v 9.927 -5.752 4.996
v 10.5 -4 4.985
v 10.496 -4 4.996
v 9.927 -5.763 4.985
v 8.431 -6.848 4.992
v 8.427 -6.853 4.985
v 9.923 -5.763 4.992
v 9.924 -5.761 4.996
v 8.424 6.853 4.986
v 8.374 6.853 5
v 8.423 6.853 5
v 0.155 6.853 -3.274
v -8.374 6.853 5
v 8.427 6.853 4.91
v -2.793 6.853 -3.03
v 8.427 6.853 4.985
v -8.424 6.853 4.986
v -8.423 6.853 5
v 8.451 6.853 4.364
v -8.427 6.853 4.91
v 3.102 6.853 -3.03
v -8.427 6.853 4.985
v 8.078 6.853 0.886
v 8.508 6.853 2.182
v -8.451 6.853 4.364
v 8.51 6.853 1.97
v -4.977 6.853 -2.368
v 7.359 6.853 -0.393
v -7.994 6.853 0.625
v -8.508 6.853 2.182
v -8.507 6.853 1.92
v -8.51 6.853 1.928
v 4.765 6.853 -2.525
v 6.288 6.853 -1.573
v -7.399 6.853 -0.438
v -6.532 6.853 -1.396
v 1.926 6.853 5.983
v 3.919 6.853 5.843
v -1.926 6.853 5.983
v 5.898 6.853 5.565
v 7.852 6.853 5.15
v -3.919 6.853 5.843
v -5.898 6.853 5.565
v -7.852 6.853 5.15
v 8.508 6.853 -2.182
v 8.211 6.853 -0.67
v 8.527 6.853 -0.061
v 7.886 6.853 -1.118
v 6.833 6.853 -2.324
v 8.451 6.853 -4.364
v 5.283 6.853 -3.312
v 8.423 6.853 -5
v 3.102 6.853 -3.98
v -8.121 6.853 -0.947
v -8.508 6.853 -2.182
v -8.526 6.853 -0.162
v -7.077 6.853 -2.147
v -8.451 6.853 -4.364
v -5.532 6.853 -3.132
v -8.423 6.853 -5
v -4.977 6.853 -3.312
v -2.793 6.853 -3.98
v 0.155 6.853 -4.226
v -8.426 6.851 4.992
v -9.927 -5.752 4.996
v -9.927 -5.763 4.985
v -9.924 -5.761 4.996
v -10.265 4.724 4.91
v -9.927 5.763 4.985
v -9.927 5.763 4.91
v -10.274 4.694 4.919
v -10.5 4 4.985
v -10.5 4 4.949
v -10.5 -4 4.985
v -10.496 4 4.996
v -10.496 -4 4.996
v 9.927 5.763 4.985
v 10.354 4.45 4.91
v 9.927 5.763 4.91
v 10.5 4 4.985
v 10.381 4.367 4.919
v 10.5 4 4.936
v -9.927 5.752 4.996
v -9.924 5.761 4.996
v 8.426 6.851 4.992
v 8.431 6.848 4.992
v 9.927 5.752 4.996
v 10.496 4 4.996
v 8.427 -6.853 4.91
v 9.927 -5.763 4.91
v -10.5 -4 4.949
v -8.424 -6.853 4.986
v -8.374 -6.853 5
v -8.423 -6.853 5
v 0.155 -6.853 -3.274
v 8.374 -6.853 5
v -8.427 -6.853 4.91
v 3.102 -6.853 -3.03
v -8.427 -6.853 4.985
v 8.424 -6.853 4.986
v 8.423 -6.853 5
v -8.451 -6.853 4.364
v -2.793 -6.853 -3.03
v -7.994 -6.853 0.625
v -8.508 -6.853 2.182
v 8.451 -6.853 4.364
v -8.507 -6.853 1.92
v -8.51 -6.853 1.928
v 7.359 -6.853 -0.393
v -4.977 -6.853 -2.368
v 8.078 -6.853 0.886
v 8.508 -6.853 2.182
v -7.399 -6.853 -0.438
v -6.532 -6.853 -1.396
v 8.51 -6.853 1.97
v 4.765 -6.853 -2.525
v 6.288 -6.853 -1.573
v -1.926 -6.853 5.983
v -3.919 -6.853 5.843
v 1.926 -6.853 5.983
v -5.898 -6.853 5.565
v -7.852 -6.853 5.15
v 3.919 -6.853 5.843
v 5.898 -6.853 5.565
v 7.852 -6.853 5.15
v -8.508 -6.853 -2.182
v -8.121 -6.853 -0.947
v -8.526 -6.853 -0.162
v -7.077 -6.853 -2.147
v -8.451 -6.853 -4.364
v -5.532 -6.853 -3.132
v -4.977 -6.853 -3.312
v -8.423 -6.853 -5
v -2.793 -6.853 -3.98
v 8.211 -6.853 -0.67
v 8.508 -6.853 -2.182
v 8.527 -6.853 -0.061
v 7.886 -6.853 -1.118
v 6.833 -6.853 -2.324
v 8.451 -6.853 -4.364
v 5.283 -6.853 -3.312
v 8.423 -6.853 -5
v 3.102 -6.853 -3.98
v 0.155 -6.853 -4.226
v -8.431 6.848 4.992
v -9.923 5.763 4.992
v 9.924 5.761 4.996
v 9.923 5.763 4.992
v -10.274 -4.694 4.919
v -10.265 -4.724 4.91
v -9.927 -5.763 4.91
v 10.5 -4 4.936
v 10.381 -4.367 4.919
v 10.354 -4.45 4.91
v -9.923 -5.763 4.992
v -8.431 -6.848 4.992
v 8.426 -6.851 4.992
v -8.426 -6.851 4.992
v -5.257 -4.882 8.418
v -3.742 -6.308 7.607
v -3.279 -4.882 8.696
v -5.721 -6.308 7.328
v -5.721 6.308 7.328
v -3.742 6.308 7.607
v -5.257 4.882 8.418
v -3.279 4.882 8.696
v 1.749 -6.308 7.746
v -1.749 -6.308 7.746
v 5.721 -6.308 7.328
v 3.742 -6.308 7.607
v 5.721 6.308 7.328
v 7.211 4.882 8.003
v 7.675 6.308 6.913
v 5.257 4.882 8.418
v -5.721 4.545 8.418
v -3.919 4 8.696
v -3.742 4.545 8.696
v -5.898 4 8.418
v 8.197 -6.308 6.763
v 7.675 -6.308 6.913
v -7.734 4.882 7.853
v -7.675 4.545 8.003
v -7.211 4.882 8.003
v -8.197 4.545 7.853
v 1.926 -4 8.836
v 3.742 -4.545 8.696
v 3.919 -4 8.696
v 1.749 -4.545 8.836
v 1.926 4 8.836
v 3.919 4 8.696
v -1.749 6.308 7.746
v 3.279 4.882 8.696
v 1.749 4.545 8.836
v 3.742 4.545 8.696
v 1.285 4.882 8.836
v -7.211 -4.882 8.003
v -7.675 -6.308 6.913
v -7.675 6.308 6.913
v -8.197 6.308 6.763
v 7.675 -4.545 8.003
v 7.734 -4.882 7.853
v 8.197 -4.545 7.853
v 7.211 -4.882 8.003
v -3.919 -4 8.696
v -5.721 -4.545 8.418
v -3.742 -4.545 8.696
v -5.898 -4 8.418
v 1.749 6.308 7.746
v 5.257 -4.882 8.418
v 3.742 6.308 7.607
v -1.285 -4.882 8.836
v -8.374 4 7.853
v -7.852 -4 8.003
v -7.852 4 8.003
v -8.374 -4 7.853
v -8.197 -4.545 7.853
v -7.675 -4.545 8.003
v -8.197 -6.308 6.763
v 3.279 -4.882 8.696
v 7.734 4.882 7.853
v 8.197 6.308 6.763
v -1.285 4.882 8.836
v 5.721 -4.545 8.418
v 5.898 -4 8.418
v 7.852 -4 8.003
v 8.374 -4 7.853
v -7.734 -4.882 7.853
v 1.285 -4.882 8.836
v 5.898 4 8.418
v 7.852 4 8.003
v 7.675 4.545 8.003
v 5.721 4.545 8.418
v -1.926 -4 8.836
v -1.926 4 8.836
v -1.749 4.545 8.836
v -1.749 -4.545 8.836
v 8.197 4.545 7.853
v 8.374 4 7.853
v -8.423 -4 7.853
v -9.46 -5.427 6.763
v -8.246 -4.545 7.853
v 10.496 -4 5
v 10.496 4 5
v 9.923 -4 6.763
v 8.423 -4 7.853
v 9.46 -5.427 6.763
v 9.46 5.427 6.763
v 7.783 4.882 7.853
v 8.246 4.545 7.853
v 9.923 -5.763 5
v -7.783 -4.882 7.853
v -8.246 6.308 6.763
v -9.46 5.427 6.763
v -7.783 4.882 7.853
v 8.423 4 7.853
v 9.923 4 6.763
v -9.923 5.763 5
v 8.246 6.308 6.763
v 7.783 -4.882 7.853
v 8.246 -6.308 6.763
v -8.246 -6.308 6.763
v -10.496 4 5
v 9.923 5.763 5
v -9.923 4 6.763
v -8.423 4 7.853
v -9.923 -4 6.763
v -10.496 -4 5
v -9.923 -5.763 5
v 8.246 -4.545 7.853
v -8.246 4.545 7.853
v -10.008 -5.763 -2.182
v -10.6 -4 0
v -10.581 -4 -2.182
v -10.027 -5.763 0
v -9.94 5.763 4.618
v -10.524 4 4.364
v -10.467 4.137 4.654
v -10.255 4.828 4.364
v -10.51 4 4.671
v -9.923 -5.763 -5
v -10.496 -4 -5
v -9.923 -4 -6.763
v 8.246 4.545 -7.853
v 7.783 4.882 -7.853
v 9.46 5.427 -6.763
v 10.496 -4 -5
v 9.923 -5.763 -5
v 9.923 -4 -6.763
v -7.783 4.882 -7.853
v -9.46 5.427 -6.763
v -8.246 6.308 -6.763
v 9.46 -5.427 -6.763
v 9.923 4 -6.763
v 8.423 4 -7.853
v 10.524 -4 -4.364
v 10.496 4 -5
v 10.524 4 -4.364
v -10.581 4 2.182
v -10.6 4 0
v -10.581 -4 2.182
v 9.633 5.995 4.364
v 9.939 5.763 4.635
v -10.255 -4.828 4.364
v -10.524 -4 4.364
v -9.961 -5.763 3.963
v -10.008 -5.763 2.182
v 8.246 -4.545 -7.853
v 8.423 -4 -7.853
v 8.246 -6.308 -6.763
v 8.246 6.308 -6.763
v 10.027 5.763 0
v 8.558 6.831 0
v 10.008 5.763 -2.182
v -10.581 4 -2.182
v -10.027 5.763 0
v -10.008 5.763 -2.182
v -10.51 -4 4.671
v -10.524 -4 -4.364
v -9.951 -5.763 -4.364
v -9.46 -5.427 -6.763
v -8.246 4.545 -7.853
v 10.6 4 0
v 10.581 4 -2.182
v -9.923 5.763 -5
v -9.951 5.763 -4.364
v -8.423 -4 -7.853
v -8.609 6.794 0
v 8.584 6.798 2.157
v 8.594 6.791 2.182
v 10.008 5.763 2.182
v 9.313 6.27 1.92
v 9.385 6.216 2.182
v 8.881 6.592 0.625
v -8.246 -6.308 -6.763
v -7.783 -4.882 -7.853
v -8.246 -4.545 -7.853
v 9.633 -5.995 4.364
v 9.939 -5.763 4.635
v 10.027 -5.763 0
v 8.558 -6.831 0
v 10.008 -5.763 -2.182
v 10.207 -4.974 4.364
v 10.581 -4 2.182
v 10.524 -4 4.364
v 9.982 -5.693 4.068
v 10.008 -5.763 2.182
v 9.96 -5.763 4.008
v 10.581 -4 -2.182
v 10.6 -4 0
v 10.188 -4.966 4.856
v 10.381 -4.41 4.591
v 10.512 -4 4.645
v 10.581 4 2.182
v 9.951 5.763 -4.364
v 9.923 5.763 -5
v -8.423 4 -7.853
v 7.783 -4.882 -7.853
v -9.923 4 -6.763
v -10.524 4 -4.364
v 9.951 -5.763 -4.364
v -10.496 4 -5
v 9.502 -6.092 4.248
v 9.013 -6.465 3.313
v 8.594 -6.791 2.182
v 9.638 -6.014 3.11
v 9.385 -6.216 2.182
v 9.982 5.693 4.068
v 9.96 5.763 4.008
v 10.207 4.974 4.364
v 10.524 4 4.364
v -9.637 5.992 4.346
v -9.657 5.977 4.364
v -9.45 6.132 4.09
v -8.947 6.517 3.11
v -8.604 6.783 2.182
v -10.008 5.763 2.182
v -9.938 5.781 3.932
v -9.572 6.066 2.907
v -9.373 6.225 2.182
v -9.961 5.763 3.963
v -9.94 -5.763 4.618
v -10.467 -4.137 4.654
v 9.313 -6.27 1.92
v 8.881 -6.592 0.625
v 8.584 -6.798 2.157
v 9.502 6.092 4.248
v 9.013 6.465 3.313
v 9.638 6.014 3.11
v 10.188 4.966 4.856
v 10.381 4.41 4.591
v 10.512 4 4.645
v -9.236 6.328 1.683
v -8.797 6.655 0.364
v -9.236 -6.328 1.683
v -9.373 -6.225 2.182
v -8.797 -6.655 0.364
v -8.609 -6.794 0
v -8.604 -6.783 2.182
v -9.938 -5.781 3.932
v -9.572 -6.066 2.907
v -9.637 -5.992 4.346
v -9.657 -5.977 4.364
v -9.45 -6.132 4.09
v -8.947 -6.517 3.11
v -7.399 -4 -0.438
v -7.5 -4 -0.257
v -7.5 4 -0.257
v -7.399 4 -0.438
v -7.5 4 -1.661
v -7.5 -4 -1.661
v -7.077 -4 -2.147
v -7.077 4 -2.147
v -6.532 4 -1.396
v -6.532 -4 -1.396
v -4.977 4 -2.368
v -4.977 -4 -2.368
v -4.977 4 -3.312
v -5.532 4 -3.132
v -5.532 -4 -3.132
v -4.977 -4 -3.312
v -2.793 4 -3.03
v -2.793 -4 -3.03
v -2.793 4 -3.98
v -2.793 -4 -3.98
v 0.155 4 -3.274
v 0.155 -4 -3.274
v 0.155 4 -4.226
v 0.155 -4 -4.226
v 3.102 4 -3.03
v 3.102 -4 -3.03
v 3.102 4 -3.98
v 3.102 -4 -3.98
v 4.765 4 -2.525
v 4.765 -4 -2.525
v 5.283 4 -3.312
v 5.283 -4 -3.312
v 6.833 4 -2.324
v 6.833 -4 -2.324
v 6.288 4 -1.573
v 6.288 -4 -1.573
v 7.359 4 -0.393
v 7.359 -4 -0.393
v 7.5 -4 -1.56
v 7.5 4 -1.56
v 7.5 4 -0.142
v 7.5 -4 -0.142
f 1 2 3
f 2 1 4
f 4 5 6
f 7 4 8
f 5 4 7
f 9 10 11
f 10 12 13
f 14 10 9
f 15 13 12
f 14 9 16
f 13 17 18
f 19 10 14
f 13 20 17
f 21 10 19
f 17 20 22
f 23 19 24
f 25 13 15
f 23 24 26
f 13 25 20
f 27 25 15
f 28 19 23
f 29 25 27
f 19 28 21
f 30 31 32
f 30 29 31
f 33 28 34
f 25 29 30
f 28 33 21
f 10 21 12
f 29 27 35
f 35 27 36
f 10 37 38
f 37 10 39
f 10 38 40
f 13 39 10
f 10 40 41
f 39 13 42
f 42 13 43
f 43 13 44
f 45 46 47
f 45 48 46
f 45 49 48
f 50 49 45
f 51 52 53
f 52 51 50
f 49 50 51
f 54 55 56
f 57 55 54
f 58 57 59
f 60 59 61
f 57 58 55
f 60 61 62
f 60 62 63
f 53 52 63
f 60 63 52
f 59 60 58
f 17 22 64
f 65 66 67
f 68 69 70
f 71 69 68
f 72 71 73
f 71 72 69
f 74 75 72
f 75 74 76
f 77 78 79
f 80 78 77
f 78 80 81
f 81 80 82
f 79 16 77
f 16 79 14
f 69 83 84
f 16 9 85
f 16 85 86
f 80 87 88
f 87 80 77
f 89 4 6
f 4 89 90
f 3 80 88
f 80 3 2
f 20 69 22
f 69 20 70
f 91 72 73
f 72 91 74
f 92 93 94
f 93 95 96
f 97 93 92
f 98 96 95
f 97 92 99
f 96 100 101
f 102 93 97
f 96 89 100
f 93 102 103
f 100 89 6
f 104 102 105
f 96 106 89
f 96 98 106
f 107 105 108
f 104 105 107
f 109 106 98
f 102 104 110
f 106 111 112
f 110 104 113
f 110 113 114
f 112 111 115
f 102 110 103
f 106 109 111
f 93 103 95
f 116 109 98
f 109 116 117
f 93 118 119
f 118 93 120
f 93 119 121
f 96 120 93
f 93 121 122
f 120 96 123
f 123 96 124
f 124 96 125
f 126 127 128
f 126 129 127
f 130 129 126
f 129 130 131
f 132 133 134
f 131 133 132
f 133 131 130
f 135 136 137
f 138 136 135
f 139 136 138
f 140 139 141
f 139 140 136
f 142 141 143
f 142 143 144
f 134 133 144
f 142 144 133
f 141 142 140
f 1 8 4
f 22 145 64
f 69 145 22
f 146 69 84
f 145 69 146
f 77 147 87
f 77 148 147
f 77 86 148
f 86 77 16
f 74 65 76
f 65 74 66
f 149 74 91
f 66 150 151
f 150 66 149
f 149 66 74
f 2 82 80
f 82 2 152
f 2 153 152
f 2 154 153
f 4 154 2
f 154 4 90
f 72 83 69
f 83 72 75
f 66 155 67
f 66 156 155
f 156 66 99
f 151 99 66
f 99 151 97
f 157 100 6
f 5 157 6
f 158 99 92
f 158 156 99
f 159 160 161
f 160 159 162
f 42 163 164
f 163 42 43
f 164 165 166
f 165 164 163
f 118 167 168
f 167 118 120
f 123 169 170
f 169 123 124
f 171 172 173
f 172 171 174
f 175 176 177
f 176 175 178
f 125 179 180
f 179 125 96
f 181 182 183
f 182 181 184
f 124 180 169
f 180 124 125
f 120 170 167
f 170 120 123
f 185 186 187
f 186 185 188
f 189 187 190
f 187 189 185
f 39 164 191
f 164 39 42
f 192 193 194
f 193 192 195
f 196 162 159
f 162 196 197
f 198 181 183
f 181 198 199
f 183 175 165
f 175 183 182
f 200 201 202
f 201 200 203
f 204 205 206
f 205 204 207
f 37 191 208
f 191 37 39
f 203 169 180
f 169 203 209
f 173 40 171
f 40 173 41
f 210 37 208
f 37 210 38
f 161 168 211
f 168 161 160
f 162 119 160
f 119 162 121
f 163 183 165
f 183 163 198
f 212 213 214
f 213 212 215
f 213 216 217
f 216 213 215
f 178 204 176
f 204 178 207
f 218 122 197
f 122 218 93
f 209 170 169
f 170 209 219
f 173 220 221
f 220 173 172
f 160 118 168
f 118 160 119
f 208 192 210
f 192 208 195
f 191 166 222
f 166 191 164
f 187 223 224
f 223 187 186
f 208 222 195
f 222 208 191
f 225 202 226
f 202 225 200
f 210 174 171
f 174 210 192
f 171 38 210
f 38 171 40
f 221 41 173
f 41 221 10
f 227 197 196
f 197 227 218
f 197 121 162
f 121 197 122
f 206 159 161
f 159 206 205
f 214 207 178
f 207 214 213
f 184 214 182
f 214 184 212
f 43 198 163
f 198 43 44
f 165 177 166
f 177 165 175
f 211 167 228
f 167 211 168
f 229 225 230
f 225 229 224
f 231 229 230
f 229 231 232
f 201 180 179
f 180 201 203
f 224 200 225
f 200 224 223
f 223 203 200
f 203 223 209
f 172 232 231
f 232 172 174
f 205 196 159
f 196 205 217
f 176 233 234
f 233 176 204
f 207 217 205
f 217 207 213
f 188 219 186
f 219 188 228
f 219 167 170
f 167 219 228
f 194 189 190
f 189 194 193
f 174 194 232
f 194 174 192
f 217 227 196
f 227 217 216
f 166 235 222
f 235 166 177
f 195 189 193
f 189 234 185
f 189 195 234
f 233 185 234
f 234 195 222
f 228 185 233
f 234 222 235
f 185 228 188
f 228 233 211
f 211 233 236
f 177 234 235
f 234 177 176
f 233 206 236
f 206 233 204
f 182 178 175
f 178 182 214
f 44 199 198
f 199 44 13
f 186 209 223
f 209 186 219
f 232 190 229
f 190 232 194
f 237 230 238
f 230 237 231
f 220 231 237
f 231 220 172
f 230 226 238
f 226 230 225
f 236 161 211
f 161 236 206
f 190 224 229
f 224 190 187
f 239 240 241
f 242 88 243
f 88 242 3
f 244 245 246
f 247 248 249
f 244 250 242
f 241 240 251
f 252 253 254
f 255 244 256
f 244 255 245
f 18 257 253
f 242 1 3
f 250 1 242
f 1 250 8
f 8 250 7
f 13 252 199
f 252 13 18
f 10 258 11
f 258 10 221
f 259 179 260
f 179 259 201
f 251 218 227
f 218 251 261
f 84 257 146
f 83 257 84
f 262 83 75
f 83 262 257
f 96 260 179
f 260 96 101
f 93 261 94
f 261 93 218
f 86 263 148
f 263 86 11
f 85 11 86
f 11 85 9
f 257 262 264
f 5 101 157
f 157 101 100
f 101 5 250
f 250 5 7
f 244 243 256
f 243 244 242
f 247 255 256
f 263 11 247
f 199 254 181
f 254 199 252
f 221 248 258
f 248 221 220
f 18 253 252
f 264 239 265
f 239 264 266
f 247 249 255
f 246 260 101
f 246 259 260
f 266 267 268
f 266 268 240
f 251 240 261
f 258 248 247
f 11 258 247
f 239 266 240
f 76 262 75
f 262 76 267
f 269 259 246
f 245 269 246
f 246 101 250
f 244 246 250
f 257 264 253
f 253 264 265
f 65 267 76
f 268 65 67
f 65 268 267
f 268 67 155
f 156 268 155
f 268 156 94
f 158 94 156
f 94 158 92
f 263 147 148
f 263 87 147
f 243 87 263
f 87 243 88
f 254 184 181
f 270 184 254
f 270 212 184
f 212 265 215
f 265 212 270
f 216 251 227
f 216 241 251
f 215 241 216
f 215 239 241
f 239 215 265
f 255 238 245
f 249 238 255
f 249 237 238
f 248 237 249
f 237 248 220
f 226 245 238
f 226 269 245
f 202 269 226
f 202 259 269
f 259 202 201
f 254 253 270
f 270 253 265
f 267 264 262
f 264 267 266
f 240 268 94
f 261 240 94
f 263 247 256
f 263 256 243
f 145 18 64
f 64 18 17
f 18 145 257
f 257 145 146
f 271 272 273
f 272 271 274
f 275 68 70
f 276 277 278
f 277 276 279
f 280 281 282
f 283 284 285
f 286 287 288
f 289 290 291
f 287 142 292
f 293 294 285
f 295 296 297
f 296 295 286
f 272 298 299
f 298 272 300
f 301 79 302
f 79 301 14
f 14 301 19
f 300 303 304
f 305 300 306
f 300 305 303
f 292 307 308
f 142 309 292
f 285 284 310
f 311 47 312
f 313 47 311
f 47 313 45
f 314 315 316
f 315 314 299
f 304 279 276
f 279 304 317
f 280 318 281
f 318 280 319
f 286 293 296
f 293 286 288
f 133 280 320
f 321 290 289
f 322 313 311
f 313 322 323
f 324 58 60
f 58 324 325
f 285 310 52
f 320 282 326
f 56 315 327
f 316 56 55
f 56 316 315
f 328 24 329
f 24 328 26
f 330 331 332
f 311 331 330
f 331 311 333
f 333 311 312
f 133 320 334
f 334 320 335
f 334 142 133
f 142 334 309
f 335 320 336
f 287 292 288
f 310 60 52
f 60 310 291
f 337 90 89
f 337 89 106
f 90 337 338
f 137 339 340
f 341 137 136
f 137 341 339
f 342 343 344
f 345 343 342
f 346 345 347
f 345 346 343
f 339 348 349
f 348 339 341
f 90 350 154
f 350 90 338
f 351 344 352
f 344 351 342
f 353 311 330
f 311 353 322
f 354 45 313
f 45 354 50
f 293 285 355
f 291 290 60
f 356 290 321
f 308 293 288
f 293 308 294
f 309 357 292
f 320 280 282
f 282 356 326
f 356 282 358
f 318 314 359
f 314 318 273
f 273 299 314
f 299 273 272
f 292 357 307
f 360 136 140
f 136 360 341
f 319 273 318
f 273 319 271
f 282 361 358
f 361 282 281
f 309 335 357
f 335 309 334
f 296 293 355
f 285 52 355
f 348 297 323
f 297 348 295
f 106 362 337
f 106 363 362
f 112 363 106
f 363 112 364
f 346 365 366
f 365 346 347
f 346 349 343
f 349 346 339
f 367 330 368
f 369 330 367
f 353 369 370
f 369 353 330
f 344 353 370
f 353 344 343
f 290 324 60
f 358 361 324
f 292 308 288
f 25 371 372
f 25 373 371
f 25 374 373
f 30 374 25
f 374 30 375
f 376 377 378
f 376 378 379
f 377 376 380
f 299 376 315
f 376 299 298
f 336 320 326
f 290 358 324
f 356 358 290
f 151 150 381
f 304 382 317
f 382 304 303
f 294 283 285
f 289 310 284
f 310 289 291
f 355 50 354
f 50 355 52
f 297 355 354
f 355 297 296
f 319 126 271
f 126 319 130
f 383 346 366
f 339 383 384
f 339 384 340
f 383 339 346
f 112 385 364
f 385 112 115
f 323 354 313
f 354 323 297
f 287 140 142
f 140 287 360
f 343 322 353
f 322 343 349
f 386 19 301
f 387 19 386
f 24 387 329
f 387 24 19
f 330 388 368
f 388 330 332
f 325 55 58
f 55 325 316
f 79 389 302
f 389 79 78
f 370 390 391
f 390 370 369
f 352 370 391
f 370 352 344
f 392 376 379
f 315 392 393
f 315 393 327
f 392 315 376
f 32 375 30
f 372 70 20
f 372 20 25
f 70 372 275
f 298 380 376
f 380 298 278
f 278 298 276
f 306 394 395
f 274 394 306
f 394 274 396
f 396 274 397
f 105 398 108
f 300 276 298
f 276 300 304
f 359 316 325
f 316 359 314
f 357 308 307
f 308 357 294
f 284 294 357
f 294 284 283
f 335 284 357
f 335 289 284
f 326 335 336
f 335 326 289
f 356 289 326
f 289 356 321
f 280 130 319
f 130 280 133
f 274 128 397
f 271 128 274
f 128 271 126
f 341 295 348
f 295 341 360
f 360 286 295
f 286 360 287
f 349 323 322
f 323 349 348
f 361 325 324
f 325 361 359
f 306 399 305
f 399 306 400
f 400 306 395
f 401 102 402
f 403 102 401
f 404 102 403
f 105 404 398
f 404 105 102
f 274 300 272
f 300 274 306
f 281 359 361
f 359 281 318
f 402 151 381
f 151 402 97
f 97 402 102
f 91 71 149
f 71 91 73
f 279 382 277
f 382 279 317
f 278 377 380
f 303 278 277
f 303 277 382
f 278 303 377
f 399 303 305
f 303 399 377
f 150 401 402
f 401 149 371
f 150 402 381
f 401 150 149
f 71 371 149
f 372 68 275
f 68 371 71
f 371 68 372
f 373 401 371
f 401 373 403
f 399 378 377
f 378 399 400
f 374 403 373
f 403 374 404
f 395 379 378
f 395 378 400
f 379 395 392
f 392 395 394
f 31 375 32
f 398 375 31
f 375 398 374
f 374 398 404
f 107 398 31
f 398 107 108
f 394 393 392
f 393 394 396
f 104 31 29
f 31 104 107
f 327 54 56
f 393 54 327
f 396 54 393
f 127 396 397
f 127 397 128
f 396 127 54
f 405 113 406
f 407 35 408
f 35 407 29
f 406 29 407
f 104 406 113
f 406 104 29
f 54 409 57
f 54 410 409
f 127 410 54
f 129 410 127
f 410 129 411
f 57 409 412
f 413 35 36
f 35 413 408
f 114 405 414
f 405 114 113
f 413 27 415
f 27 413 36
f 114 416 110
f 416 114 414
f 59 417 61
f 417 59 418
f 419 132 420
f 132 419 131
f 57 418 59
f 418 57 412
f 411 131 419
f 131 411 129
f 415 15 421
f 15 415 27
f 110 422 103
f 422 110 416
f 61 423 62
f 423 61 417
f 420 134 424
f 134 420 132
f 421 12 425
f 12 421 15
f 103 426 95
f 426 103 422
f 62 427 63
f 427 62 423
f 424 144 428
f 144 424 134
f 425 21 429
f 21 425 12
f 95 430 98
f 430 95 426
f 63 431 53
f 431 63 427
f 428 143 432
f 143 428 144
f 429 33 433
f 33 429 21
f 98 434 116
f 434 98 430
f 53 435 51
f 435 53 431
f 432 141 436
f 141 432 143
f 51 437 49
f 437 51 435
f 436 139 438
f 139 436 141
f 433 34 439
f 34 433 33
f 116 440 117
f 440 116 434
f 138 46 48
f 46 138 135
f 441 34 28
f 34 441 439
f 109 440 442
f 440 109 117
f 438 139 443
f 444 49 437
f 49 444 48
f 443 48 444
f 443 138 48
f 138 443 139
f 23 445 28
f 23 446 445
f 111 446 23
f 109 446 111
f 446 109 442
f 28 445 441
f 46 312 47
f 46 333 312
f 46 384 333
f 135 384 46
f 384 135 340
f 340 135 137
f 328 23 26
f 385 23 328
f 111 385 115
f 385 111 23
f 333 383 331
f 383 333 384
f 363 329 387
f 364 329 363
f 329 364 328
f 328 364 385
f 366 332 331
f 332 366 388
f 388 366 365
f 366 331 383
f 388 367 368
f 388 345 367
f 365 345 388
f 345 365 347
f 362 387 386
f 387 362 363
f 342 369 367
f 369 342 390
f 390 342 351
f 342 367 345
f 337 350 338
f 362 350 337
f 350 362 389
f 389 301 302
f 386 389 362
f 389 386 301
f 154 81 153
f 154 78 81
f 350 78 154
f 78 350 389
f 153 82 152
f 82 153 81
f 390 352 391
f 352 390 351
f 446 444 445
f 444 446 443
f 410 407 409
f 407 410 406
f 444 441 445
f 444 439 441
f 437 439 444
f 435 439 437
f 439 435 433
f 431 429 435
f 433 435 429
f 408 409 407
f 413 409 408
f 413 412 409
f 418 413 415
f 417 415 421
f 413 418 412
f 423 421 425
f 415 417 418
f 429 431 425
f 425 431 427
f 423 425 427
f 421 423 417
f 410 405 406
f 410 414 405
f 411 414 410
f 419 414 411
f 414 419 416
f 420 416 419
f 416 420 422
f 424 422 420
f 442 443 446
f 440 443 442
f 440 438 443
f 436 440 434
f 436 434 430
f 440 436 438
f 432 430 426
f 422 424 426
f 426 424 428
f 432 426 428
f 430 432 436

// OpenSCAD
// file: bezier.scad
function CubicBezierT( P, a, t ) = let(ti = 1-t) ti*ti*ti*P[0][a]+3*ti*ti*t*P[1][a]+3*(ti)*t*t*P[2][a]+t*t*t*P[3][a];
function CubicBezierPoint( P, t ) = [for(a=[0:len(P[0])-1]) CubicBezierT( P, a, t )];
function CubicBezierPoints( P, steps ) = [for(t=[0:1.0/steps:1.0]) CubicBezierPoint(P,t)];
    
module CubicBezer(P, steps, d1,d2, h) {
    BezierPoints = CubicBezierPoints(P,steps);
    for(i = [0:len(BezierPoints)-2]) {
        hull() {
            translate(BezierPoints[i]) cylinder(d1=d1,d2=d2, h=h, center=true);
            translate(BezierPoints[i+1]) cylinder(d1=d1,d2=d2, h=h, center=true);
        }
    }
}
ControlPoints = [[0,0,0],[110,-60,0],[125,60,0],[150,65,0]];
//CubicBezer(ControlPoints,50,3,2.5,1);
// main file
include <bezier.scad>

$fa=1;
base_height = 10.0;
base_length = 15.0;
base_width = 8;
base_roundness = 3;
base_top_arc = 1;
base_side_arc = 0.1;

ControlPoints1 = [
    [-base_length/4*3,0,base_height/2,          0.1],
    [-base_length/2,0,base_height/2,            1],
    [-base_length/2*1.5,0,-base_height/4*1.5,   1],
    [0,0,-base_height/4*1.5,                    1]];
ControlPoints2 = [
    [0,0,-base_height/4*1.5,                    1],
    [base_length/2*1.5,0,-base_height/4*1.5,    1],
    [base_length/2,0,base_height/2,             1],
    [base_length/4*3,0,base_height/2,           0.1]];


function get_arc_r( chord_len, arc_h ) = 
    let(b=chord_len/2,a=arc_h) 
        (sqrt(b*b+a*a)/2) / cos(atan(b/a));
        
base_top_arc_r = get_arc_r(base_length, base_top_arc);
base_side_arc_r = get_arc_r(base_height, base_side_arc);

cube([base_length, base_width, base_height], center=true);

module base_shape() {
    intersection() {
        translate([0,0,2*base_top_arc])
            cube([base_length, base_width, base_height], center=true);
        translate([0,0,base_height/2-base_top_arc_r+base_top_arc]) 
            rotate([90,0,0]) 
                cylinder(r=base_top_arc_r, h=base_width*2, center=true);
    }

    if ( base_side_arc_r > 0 ) {
        intersection() {
            translate([-2*base_side_arc,0,0])
                cube([base_length, base_width, base_height], center=true);
            translate([-base_length/2+base_side_arc_r-base_side_arc,0,0]) 
                rotate([90,0,0]) 
                    cylinder(r=base_side_arc_r, h=base_width*2, center=true);
        }
        intersection() {
            translate([2*base_side_arc,0,0])
                cube([base_length, base_width, base_height], center=true);
            translate([base_length/2-base_side_arc_r+base_side_arc,0,0]) 
                rotate([90,0,0]) 
                    cylinder(r=base_side_arc_r, h=base_width*2, center=true);
        }
    }
}


difference() {
    minkowski() {
        base_shape();
        sphere( r=base_roundness, center=true );
    }

    BezierPoints = concat(CubicBezierPoints(ControlPoints1,10),
        CubicBezierPoints(ControlPoints2,10));
    for(i = [0:len(BezierPoints)-2]) { 
        trans0=[BezierPoints[i][0],BezierPoints[i][1],BezierPoints[i][2]];
        trans1=[BezierPoints[i+1][0],BezierPoints[i+1][1],BezierPoints[i+1][2]];

        hull() {
            translate(trans0) rotate([90,0,0]) 
                cylinder(d=BezierPoints[i][3], h=base_width*2, center=true);
            translate(trans1) rotate([90,0,0])
                cylinder(d=BezierPoints[i+1][3], h=base_width*2, center=true);
        }
    }
}
